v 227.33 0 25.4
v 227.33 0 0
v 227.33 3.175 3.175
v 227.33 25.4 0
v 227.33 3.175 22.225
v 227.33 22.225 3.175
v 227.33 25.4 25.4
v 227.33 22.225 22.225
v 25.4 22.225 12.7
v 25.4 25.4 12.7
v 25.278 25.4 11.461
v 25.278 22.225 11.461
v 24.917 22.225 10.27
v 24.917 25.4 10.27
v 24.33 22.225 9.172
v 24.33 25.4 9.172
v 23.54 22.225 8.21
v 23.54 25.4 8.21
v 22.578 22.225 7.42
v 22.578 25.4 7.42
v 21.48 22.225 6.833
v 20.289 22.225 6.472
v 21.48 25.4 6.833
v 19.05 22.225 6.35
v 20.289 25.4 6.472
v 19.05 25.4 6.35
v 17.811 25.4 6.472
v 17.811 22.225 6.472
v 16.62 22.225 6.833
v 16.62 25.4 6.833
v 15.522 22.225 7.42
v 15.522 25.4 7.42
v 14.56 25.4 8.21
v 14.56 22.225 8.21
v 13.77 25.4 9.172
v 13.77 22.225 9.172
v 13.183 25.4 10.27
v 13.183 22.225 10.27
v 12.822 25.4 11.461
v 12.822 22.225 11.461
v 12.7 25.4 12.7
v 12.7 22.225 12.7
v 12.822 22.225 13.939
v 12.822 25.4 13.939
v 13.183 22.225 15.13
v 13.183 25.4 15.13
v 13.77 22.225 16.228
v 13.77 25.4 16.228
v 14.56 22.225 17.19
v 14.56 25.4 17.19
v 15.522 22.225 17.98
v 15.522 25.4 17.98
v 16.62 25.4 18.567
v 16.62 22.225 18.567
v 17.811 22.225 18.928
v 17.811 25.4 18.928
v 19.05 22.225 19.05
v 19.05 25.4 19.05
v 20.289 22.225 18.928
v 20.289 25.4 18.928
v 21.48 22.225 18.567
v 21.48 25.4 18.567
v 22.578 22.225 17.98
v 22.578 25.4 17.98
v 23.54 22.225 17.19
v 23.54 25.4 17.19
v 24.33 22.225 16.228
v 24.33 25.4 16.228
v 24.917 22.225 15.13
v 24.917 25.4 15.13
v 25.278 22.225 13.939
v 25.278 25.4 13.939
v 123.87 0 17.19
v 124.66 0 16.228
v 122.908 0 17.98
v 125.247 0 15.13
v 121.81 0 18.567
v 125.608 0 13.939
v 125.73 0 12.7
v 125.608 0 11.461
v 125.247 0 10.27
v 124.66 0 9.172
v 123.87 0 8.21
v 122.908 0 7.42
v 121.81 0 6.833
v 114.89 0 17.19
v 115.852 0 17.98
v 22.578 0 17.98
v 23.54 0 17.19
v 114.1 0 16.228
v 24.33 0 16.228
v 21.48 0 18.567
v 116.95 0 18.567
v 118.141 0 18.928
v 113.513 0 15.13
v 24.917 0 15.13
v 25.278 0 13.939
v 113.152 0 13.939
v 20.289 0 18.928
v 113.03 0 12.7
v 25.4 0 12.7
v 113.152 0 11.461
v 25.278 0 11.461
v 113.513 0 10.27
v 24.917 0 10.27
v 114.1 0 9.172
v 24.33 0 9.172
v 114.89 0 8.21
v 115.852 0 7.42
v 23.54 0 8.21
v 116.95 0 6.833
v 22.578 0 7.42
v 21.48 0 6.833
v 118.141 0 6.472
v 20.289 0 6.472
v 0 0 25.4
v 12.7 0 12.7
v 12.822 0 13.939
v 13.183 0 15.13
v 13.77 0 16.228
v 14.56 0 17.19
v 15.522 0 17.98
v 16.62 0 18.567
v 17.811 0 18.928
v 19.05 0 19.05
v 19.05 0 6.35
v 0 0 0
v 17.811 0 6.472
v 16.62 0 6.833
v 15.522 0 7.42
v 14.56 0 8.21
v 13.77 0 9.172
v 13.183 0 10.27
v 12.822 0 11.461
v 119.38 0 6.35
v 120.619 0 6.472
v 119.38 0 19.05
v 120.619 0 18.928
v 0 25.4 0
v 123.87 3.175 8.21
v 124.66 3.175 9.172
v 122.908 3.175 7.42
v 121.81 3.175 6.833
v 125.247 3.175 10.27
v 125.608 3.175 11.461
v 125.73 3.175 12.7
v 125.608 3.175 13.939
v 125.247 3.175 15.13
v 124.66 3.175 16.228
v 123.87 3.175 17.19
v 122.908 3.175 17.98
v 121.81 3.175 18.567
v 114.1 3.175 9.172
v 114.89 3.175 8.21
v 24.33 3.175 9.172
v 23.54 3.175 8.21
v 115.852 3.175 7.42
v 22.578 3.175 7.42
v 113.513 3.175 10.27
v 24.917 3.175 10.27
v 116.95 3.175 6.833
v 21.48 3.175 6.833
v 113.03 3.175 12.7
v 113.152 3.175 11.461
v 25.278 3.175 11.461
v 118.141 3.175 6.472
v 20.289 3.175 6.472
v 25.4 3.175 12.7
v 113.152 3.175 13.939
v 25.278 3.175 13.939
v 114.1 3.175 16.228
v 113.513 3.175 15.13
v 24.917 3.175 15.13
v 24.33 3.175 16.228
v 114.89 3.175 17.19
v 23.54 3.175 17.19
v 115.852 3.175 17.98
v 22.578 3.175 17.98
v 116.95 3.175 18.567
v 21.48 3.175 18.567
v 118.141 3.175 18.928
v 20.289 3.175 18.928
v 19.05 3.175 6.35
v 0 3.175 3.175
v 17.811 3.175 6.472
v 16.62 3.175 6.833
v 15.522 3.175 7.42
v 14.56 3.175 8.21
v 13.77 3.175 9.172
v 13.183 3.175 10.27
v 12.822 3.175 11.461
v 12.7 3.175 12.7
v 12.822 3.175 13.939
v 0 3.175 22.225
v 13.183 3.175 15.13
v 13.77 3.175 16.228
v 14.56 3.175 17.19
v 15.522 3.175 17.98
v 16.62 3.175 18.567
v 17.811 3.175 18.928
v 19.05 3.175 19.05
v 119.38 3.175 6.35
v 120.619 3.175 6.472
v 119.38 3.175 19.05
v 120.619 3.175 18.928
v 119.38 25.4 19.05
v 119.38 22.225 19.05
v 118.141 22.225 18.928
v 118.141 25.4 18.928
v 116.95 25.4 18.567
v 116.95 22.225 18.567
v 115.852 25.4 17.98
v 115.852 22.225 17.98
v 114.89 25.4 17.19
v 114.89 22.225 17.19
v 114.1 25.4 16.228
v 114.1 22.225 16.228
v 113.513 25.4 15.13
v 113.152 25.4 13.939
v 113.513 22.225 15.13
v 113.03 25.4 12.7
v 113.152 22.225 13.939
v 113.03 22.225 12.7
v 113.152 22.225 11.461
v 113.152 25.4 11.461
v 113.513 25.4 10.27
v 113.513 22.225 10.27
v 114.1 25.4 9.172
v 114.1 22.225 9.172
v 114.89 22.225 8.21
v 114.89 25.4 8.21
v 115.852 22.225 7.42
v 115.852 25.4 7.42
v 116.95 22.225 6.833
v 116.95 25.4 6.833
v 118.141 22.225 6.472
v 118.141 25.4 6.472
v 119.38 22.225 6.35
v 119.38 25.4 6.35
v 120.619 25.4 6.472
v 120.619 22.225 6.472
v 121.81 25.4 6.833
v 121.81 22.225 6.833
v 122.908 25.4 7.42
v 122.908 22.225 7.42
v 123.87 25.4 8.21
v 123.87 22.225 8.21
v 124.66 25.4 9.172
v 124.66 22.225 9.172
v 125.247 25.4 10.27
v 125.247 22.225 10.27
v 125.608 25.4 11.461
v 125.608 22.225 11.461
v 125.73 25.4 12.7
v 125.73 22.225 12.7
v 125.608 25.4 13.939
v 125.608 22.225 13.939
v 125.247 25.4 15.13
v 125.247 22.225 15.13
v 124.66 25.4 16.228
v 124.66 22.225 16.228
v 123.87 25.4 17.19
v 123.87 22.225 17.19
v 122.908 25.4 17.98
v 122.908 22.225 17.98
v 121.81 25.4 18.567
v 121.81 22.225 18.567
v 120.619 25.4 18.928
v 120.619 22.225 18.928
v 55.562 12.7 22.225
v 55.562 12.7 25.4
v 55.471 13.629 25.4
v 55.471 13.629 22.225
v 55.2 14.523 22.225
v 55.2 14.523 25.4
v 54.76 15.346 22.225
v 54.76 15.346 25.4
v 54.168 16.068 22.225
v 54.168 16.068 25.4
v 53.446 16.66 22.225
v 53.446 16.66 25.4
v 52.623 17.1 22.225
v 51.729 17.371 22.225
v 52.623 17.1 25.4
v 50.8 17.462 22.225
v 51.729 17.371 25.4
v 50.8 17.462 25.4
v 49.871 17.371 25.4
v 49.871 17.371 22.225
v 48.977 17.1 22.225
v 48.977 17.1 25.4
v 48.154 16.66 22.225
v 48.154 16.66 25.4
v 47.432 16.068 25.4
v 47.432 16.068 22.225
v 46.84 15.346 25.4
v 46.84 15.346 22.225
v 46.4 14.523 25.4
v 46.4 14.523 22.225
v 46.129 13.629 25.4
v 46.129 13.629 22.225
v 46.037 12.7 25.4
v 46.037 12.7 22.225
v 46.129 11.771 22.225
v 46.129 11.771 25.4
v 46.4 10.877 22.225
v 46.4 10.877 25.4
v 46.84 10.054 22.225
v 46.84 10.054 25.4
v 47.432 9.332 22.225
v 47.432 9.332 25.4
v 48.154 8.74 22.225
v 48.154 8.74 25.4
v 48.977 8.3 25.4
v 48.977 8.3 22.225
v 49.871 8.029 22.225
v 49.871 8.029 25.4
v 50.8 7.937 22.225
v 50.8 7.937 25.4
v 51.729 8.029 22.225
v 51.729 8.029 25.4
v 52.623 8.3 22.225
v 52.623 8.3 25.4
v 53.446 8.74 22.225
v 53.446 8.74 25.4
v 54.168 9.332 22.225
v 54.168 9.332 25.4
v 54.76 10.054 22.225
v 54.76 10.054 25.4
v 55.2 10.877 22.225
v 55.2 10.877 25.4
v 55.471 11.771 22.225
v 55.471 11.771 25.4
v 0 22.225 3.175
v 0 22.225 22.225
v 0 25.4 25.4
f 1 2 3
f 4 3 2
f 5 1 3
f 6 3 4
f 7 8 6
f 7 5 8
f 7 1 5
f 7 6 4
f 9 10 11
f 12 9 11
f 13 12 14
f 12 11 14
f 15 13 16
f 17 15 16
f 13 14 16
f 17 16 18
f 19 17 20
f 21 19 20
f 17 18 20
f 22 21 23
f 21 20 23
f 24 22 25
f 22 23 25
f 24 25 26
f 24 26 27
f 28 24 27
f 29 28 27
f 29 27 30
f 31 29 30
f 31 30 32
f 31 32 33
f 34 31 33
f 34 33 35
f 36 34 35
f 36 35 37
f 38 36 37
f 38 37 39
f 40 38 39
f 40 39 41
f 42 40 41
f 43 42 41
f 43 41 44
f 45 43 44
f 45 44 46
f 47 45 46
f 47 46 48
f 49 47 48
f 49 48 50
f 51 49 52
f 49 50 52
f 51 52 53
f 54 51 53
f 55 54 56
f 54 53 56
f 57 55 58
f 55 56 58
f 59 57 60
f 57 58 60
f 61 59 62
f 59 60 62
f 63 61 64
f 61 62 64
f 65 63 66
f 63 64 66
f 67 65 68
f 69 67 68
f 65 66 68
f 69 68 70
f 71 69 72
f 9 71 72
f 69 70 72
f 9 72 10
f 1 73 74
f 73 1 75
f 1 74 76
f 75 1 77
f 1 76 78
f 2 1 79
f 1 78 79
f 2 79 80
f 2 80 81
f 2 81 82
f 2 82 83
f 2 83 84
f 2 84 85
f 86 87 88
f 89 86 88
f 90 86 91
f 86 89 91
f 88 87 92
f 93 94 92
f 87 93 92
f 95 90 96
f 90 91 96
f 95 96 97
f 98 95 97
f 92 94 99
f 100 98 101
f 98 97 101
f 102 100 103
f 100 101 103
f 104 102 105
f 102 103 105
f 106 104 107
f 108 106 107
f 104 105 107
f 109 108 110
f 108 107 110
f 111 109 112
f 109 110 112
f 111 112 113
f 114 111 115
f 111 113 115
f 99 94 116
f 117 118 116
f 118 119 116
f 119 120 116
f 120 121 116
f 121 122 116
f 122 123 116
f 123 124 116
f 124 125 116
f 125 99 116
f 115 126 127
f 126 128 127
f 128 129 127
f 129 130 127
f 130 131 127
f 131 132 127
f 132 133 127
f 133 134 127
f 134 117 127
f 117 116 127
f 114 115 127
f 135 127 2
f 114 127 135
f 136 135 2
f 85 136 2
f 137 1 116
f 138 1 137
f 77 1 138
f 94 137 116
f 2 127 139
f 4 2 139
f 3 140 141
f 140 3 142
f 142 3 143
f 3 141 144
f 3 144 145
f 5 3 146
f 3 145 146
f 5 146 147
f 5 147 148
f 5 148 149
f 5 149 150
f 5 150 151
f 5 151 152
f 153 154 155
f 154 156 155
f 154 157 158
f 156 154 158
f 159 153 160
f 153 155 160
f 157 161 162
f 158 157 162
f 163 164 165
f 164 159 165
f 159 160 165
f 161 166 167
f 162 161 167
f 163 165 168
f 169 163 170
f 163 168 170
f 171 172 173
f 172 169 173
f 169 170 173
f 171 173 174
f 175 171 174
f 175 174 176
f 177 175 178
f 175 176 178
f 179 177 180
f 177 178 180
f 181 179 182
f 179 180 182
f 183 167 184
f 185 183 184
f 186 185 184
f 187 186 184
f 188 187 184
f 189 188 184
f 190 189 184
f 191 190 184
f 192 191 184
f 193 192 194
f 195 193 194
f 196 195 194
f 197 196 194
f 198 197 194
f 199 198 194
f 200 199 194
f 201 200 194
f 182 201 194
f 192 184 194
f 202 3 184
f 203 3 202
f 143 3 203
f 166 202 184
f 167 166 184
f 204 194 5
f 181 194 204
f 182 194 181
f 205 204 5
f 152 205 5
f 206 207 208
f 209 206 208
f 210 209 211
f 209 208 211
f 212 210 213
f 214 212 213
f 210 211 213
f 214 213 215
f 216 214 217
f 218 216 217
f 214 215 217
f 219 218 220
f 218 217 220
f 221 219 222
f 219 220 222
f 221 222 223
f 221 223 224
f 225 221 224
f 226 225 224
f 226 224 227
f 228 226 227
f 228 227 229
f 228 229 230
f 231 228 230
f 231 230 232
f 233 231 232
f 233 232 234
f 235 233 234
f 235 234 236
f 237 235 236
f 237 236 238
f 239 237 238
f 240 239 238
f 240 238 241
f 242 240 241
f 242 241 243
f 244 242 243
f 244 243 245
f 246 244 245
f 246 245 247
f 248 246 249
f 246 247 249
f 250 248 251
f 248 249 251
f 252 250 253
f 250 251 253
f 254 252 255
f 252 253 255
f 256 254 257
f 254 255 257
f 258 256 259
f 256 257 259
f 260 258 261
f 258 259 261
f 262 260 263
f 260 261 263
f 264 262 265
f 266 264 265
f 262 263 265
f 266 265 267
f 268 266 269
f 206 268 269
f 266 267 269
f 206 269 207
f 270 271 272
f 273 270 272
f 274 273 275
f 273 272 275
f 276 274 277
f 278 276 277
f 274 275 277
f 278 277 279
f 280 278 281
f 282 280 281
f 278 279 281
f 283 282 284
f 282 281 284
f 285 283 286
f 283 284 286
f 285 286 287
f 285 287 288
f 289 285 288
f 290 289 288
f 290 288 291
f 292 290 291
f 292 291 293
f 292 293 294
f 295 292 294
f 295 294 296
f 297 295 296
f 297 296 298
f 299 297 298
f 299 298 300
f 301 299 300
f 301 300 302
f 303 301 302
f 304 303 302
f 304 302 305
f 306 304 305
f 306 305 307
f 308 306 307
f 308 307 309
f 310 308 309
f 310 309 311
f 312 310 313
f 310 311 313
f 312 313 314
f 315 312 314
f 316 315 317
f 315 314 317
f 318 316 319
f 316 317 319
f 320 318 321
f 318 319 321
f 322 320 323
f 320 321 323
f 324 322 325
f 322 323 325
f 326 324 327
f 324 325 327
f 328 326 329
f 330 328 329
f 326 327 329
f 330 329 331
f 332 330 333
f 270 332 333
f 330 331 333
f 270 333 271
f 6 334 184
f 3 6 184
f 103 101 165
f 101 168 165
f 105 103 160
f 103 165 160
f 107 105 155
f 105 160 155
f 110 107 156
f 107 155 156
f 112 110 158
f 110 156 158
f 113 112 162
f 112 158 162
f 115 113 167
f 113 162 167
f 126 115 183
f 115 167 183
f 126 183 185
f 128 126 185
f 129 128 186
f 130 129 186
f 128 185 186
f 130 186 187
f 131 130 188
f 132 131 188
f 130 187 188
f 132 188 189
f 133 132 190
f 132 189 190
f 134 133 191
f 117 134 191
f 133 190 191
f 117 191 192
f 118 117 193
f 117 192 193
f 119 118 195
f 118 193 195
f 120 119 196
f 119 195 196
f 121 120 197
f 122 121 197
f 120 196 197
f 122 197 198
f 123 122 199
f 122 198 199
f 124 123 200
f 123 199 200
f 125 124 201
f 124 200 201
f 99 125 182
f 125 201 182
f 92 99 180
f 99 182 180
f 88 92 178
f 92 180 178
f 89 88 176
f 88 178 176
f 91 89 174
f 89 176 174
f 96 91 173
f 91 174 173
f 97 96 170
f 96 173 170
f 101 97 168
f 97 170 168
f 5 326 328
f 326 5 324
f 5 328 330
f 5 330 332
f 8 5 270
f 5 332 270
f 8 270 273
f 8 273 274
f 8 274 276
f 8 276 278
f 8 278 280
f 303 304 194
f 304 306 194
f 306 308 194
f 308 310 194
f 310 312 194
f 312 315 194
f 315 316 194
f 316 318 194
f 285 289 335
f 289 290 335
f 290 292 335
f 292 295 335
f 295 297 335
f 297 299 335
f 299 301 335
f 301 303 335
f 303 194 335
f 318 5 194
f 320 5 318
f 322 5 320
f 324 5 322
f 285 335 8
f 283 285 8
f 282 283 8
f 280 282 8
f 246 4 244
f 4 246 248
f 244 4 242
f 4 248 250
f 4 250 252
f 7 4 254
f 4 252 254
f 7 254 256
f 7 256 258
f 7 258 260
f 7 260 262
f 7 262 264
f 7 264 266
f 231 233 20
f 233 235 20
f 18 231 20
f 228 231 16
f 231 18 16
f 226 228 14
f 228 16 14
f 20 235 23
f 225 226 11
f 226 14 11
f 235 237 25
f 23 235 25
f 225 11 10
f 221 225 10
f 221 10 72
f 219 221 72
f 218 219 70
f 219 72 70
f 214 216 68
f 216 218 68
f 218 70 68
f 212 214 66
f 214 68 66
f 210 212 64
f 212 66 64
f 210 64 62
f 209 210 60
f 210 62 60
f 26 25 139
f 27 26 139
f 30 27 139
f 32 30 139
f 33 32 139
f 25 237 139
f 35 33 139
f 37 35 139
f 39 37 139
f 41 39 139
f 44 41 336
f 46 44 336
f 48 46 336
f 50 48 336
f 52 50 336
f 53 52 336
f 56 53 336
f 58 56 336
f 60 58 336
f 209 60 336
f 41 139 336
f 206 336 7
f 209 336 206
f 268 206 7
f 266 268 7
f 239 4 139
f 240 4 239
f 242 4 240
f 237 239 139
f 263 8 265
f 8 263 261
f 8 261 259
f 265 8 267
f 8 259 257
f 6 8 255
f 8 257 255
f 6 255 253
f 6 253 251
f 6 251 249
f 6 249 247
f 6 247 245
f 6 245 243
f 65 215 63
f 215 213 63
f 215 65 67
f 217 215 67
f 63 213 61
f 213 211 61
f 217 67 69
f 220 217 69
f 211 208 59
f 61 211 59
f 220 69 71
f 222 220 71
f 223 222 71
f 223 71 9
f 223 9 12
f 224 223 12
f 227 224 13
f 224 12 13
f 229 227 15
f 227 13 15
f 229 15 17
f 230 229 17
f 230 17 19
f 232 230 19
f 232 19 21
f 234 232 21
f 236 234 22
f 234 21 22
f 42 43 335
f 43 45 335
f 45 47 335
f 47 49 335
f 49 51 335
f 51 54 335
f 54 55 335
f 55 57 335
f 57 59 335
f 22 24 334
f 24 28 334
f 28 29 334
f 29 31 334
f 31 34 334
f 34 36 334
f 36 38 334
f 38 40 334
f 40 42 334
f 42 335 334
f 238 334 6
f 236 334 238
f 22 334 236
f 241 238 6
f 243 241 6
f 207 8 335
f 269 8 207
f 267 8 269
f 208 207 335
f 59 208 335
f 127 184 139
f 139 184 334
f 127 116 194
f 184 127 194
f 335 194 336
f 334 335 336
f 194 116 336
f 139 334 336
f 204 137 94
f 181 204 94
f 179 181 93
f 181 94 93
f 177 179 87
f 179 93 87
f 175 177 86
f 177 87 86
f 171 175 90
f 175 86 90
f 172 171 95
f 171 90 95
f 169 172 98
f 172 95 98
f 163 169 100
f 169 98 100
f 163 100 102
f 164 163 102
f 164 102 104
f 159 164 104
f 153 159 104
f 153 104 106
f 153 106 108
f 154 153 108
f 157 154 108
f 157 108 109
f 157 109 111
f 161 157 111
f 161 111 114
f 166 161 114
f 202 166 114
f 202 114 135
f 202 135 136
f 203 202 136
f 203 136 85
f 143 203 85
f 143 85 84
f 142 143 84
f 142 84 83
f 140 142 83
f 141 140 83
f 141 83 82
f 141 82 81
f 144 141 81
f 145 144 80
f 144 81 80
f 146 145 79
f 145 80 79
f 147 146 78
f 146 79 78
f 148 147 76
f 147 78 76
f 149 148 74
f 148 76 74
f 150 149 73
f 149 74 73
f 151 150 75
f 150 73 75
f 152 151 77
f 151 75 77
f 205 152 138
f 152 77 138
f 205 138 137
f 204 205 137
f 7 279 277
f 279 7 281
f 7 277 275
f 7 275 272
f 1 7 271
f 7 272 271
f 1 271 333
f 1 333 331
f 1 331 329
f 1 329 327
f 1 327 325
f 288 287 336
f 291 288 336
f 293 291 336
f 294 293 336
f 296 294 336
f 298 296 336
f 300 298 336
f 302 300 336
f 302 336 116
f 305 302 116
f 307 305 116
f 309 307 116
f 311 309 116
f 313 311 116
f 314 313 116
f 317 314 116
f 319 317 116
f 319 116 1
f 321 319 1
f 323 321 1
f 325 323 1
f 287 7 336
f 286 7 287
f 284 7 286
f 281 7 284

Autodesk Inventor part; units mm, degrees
ref_plane "YZ Plane" through (0, 0, 0) normal (1, 0, 0) x (0, 1, 0)
ref_plane "XZ Plane" through (0, 0, 0) normal (0, 1, 0) x (-1, 0, 0)
ref_plane "XY Plane" through (0, 0, 0) normal (0, 0, 1) x (1, 0, 0)
sketch "Sketch1" plane through (0, 0, 0) normal (1, 0, 0) x (0, 1, 0)
  line L0 (0, 0) -> (25.4, 0)
  line L1 (25.4, 0) -> (25.4, 25.4)
  line L2 (25.4, 25.4) -> (0, 25.4)
  line L3 (0, 25.4) -> (0, 0)
  line L4 (3.175, 22.225) -> (22.225, 22.225)
  line L5 (22.225, 22.225) -> (22.225, 3.175)
  line L6 (22.225, 3.175) -> (3.175, 3.175)
  line L7 (3.175, 3.175) -> (3.175, 22.225)
  dimension "d0" = 25.4
  dimension "d1" = 25.4
  dimension "d2" = 3.175
extrude "Extrusion1" add sketch "Sketch1" along normal blind 227.33
sketch "Sketch2" plane through (0, 25.4, 25.4) normal (0, 1, 0) x (1, 0, 0)
  line L0 (0, 25.4) -> (0, 0) projected
  line L1 (0, 25.4) -> (227.33, 25.4) projected
  circle A0 centre (19.05, 12.7) radius 6.35
  dimension "d5" = 12.7
  dimension "d6" = 12.7
  dimension "d7" = 19.05
extrude "Extrusion2" cut sketch "Sketch2" against normal blind 25.4
sketch "Sketch3" plane through (0, 0, 25.4) normal (0, 0, 1) x (1, 0, 0)
  line L0 (0, 25.4) -> (0, 0) projected
  line L1 (0, 25.4) -> (227.33, 25.4) projected
  circle A0 centre (50.8, 12.7) radius 4.7625
  dimension "d10" = 9.525
  dimension "d11" = 50.8
  dimension "d12" = 12.7
extrude "Extrusion3" cut sketch "Sketch3" against normal up to next
sketch "Sketch4" plane through (0, 25.4, 25.4) normal (0, 1, 0) x (1, 0, 0)
  line L0 (227.33, 25.4) -> (227.33, 0) projected
  line L1 (0, 25.4) -> (227.33, 25.4) projected
  point P0 (119.38, 12.7)
  dimension "d15" = 12.7
  dimension "d16" = 107.95
hole "Hole1" at (119.38, 25.4, 12.7) direction (0, -1, 0) diameter 12.7 end through all
properties part number "Box 9 inch" material "Aluminum 6061"
